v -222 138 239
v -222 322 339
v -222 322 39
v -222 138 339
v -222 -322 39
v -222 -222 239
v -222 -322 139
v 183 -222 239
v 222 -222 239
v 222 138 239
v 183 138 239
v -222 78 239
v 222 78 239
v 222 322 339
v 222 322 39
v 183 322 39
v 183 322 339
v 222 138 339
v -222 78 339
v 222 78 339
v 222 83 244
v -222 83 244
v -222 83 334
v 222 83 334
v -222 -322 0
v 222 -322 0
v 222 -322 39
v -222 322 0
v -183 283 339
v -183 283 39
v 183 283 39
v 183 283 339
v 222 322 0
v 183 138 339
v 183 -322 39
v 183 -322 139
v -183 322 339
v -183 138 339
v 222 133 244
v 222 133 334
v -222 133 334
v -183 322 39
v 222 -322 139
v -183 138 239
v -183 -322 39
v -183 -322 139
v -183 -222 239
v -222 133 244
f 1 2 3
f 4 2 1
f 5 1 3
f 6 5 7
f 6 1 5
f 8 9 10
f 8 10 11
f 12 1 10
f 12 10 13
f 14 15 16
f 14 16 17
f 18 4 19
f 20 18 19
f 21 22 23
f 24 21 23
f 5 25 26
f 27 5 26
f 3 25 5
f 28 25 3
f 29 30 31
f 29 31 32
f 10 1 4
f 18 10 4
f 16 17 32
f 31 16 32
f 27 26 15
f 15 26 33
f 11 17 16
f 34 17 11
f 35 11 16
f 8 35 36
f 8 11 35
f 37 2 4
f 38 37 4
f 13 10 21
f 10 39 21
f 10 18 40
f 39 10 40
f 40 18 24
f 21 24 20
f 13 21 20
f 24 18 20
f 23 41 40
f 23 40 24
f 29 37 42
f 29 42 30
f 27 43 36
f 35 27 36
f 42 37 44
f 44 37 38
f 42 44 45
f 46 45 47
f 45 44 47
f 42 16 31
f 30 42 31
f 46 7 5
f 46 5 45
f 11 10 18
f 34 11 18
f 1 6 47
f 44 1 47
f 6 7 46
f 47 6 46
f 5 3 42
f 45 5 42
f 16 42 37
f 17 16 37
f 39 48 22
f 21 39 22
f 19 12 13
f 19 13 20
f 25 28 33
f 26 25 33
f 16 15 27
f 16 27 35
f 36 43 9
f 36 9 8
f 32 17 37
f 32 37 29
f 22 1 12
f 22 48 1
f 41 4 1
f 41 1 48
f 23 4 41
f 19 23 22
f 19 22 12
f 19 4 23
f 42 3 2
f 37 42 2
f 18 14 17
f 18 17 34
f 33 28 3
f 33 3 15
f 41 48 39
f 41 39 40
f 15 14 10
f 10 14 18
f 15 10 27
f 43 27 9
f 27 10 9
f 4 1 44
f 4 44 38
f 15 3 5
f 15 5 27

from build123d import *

# Parameters (mm, degrees)
F0_W      = 444
F0_H      = 644
F1_DEPTH  = 39
F2_W      = 39
F2_H      = 200
F3_DEPTH  = 644
F4_W      = 184
F4_H      = 100
F5_DEPTH  = 39
F7_W      = 39
F7_H      = 300
F8_DEPTH  = 366
F9_SIZE   = 100
F9_2_SIZE = 100
F10_W     = 60
F10_H     = 100
F10_W_2   = 50
F10_H_2   = 90
F11_DEPTH = 444


with BuildPart() as f1:
    # F0 (on Top) → F1 (new body)
    with BuildSketch(Plane.XY):
        Rectangle(F0_W, F0_H)
    extrude(amount=F1_DEPTH)


with BuildPart() as f3:
    # F2 (on face) → F3 (new body, through all)
    with BuildSketch(Plane.XZ.offset(322)):
        with Locations((-202.5, 139)):
            Rectangle(F2_W, F2_H)
    extrude(amount=-F3_DEPTH)

    # F4 (on face) → F5 (join)
    with BuildSketch(Plane(origin=(-222, 0, 0), x_dir=(0, -1, 0), z_dir=(-1, 0, 0))):
        with Locations((-230, 289)):
            Rectangle(F4_W, F4_H)
    extrude(amount=-F5_DEPTH)


with BuildPart() as f6_1:
    # F6: instance of F3
    add(f3.part.mirror(Plane.YZ))

    # F9#2
    f9_2_edges = [f6_1.edges().sort_by_distance(p)[0] for p in [
        (202.5, -322, 239),
    ]]
    chamfer(f9_2_edges, length=F9_2_SIZE)


with BuildPart() as f8:
    # F7 (on face) → F8 (new body, through all)
    with BuildSketch(Plane(origin=(183, 0, 0), x_dir=(0, -1, 0), z_dir=(-1, 0, 0))):
        with Locations((-302.5, 189)):
            Rectangle(F7_W, F7_H)
    extrude(amount=F8_DEPTH)


with BuildPart() as f3_1:
    add(f3.part)

    # F9
    f9_edges = [f3_1.edges().sort_by_distance(p)[0] for p in [
        (-202.5, -322, 239),
    ]]
    chamfer(f9_edges, length=F9_SIZE)


with BuildPart() as f11:
    # F10 (on face) → F11 (new body, through all)
    with BuildSketch(Plane(origin=(-222, 0, 0), x_dir=(0, -1, 0), z_dir=(-1, 0, 0))):
        with Locations((-108, 289)):
            Rectangle(F10_W, F10_H)
        with Locations((-108, 289)):
            Rectangle(F10_W_2, F10_H_2, mode=Mode.SUBTRACT)
    extrude(amount=-F11_DEPTH)


solid = Compound([f1.part, f6_1.part, f8.part, f3_1.part, f11.part])
